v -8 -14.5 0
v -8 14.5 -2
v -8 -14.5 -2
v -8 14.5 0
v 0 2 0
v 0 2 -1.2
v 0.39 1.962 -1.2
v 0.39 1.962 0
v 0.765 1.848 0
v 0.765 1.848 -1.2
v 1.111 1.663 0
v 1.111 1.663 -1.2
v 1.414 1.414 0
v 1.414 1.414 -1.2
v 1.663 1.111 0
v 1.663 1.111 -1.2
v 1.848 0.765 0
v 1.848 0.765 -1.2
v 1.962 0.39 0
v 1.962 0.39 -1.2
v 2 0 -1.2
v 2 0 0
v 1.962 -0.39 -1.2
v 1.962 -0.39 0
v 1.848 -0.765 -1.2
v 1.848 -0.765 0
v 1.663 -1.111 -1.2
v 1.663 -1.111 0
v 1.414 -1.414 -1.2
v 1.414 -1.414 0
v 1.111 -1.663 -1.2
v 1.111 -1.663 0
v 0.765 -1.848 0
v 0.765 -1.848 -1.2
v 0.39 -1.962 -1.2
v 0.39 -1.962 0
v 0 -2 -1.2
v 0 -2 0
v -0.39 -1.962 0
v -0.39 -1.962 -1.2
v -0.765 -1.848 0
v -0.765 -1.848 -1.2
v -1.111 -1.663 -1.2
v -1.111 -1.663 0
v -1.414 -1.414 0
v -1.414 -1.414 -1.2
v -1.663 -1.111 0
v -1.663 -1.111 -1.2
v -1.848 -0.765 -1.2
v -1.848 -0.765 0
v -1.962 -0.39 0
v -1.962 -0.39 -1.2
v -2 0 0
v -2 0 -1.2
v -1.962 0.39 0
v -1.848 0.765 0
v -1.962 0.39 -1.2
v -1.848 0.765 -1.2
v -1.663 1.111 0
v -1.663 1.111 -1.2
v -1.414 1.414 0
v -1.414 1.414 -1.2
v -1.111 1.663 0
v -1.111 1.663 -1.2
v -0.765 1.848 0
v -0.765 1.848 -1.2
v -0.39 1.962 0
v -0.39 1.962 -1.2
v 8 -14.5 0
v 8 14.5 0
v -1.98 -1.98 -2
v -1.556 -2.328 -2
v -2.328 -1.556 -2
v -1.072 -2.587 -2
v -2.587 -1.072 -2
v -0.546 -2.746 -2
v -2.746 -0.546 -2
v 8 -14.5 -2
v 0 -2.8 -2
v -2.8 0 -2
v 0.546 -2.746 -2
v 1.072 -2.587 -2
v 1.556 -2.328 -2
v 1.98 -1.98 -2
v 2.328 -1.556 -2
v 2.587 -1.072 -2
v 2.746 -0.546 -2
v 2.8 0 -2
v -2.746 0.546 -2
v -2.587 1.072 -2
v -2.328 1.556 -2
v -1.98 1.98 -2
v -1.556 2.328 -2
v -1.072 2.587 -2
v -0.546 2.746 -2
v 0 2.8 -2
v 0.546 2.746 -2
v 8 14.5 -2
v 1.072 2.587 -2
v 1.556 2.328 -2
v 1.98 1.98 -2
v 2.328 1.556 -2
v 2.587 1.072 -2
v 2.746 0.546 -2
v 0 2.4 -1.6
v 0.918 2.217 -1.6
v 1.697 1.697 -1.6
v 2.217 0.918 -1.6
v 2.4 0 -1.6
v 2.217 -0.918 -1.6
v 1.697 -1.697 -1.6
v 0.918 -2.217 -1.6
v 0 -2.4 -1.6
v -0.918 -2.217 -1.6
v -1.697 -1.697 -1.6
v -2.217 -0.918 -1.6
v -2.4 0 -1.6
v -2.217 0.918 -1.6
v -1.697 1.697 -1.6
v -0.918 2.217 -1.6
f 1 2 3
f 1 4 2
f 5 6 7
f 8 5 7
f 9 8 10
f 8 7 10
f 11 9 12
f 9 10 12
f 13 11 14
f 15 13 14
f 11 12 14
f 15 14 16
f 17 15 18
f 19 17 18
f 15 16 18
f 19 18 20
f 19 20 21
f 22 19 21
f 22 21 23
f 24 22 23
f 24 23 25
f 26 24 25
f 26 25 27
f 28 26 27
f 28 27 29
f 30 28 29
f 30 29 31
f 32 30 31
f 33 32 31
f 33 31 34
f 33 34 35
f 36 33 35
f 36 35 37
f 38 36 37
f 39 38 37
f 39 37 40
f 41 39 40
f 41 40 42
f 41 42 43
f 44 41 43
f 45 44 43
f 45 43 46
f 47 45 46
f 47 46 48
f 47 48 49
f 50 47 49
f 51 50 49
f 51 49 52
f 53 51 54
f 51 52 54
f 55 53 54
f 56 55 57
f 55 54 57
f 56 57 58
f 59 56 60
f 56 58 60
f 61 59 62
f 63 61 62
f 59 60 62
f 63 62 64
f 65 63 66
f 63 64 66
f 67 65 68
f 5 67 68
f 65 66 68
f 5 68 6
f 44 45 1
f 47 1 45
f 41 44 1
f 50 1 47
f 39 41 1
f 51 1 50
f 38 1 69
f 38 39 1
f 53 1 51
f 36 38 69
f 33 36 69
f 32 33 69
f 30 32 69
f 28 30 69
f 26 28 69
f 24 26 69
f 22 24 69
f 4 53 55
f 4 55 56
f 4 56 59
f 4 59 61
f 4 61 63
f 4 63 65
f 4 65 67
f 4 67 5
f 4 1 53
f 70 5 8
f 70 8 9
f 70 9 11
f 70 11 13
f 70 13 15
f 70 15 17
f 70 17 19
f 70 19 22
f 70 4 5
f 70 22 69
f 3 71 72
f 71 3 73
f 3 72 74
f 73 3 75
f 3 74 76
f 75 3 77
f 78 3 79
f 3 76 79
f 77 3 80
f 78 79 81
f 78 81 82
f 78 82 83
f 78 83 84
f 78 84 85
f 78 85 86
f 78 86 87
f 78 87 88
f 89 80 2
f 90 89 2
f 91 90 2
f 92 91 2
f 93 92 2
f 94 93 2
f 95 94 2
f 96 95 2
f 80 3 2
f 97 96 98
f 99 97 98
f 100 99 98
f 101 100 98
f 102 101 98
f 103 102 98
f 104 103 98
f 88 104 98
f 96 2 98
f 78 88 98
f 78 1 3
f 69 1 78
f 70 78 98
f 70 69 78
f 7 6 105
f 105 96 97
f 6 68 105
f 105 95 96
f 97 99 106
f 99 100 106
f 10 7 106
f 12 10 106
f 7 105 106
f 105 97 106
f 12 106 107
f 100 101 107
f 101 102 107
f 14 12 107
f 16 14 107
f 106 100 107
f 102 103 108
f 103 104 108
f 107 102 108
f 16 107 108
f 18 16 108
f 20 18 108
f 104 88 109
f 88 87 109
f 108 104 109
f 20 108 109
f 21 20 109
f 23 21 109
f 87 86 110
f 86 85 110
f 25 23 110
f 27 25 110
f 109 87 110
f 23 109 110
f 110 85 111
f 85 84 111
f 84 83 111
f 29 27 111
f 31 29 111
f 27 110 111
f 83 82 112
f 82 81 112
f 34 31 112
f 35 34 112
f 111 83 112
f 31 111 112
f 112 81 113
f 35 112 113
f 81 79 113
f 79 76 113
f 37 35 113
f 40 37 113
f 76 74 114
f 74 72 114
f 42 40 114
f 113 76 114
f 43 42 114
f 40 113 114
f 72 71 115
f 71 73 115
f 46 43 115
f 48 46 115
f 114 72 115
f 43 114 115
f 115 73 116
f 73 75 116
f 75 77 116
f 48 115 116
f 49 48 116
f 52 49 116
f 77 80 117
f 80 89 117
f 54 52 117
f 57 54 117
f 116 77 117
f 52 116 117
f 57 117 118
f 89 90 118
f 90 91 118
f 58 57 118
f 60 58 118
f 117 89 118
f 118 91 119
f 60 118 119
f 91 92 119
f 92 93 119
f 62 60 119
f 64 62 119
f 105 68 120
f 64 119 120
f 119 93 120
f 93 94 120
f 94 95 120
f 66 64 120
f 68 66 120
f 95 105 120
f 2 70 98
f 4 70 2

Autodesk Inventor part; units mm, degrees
sketch "Sketch_1" plane through (0, 0, 0) normal (0, 0, 1) x (1, 0, 0)
  line L0 (-8, 14.5) -> (-8, -14.5)
  line L1 (-8, -14.5) -> (8, -14.5)
  line L2 (8, -14.5) -> (8, 14.5)
  line L3 (8, 14.5) -> (-8, 14.5)
extrude "Extrusion1" add sketch "Sketch_1" against normal blind 2
sketch "Sketch_2" plane through (0, 0, 0) normal (1, 0, 0) x (0, 1, 0)
  line L0 (0, -2) -> (0, 0)
  line L1 (0, 0) -> (2, 0)
  line L2 (2, 0) -> (2, -1.2)
  line L3 (2, -1.2) -> (2.8, -2)
  line L4 (2.8, -2) -> (0, -2)
  line L5 (0, -2) -> (0, 0)
revolve "Revolution1" cut sketch "Sketch_2" angle 360 about axis through (0, 0, -2) along (0, 0, -1)
ref_plane "to_magnet_XY" through (0, 0, 0) normal (0, 0, 1) x (1, 0, 0)
ref_plane "to_magnet_YZ" through (0, 0, 0) normal (1, 0, 0) x (0, 1, 0)
ref_plane "to_magnet_ZX" through (0, 0, 0) normal (0, 1, 0) x (0, 0, 1)
ref_plane "b1_XY" through (0, -25, -1.2) normal (0, 0, 1) x (1, 0, 0)
ref_plane "b1_YZ" through (0, -25, -1.2) normal (1, 0, 0) x (0, 1, 0)
ref_plane "b1_ZX" through (0, -25, -1.2) normal (0, 1, 0) x (0, 0, 1)
ref_plane "b2_XY" through (0, 25, -1.2) normal (0, 0, 1) x (1, 0, 0)
ref_plane "b2_YZ" through (0, 25, -1.2) normal (1, 0, 0) x (0, 1, 0)
ref_plane "b2_ZX" through (0, 25, -1.2) normal (0, 1, 0) x (0, 0, 1)
ref_plane "bb1_XY" through (0, 0, -1.2) normal (0, 0, 1) x (1, 0, 0)
ref_plane "bb1_YZ" through (0, 0, -1.2) normal (1, 0, 0) x (0, 1, 0)
ref_plane "bb1_ZX" through (0, 0, -1.2) normal (0, 1, 0) x (0, 0, 1)
ref_plane "b2x_XY" through (0, 25, 0) normal (0, 0, 1) x (1, 0, 0)
ref_plane "b2x_YZ" through (0, 25, 0) normal (1, 0, 0) x (0, 1, 0)
ref_plane "b2x_ZX" through (0, 25, 0) normal (0, 1, 0) x (0, 0, 1)
ref_plane "b1x_XY" through (0, -25, 0) normal (0, 0, 1) x (1, 0, 0)
ref_plane "b1x_YZ" through (0, -25, 0) normal (1, 0, 0) x (0, 1, 0)
ref_plane "b1x_ZX" through (0, -25, 0) normal (0, 1, 0) x (0, 0, 1)
properties part number "HMEN5-5-dps"
